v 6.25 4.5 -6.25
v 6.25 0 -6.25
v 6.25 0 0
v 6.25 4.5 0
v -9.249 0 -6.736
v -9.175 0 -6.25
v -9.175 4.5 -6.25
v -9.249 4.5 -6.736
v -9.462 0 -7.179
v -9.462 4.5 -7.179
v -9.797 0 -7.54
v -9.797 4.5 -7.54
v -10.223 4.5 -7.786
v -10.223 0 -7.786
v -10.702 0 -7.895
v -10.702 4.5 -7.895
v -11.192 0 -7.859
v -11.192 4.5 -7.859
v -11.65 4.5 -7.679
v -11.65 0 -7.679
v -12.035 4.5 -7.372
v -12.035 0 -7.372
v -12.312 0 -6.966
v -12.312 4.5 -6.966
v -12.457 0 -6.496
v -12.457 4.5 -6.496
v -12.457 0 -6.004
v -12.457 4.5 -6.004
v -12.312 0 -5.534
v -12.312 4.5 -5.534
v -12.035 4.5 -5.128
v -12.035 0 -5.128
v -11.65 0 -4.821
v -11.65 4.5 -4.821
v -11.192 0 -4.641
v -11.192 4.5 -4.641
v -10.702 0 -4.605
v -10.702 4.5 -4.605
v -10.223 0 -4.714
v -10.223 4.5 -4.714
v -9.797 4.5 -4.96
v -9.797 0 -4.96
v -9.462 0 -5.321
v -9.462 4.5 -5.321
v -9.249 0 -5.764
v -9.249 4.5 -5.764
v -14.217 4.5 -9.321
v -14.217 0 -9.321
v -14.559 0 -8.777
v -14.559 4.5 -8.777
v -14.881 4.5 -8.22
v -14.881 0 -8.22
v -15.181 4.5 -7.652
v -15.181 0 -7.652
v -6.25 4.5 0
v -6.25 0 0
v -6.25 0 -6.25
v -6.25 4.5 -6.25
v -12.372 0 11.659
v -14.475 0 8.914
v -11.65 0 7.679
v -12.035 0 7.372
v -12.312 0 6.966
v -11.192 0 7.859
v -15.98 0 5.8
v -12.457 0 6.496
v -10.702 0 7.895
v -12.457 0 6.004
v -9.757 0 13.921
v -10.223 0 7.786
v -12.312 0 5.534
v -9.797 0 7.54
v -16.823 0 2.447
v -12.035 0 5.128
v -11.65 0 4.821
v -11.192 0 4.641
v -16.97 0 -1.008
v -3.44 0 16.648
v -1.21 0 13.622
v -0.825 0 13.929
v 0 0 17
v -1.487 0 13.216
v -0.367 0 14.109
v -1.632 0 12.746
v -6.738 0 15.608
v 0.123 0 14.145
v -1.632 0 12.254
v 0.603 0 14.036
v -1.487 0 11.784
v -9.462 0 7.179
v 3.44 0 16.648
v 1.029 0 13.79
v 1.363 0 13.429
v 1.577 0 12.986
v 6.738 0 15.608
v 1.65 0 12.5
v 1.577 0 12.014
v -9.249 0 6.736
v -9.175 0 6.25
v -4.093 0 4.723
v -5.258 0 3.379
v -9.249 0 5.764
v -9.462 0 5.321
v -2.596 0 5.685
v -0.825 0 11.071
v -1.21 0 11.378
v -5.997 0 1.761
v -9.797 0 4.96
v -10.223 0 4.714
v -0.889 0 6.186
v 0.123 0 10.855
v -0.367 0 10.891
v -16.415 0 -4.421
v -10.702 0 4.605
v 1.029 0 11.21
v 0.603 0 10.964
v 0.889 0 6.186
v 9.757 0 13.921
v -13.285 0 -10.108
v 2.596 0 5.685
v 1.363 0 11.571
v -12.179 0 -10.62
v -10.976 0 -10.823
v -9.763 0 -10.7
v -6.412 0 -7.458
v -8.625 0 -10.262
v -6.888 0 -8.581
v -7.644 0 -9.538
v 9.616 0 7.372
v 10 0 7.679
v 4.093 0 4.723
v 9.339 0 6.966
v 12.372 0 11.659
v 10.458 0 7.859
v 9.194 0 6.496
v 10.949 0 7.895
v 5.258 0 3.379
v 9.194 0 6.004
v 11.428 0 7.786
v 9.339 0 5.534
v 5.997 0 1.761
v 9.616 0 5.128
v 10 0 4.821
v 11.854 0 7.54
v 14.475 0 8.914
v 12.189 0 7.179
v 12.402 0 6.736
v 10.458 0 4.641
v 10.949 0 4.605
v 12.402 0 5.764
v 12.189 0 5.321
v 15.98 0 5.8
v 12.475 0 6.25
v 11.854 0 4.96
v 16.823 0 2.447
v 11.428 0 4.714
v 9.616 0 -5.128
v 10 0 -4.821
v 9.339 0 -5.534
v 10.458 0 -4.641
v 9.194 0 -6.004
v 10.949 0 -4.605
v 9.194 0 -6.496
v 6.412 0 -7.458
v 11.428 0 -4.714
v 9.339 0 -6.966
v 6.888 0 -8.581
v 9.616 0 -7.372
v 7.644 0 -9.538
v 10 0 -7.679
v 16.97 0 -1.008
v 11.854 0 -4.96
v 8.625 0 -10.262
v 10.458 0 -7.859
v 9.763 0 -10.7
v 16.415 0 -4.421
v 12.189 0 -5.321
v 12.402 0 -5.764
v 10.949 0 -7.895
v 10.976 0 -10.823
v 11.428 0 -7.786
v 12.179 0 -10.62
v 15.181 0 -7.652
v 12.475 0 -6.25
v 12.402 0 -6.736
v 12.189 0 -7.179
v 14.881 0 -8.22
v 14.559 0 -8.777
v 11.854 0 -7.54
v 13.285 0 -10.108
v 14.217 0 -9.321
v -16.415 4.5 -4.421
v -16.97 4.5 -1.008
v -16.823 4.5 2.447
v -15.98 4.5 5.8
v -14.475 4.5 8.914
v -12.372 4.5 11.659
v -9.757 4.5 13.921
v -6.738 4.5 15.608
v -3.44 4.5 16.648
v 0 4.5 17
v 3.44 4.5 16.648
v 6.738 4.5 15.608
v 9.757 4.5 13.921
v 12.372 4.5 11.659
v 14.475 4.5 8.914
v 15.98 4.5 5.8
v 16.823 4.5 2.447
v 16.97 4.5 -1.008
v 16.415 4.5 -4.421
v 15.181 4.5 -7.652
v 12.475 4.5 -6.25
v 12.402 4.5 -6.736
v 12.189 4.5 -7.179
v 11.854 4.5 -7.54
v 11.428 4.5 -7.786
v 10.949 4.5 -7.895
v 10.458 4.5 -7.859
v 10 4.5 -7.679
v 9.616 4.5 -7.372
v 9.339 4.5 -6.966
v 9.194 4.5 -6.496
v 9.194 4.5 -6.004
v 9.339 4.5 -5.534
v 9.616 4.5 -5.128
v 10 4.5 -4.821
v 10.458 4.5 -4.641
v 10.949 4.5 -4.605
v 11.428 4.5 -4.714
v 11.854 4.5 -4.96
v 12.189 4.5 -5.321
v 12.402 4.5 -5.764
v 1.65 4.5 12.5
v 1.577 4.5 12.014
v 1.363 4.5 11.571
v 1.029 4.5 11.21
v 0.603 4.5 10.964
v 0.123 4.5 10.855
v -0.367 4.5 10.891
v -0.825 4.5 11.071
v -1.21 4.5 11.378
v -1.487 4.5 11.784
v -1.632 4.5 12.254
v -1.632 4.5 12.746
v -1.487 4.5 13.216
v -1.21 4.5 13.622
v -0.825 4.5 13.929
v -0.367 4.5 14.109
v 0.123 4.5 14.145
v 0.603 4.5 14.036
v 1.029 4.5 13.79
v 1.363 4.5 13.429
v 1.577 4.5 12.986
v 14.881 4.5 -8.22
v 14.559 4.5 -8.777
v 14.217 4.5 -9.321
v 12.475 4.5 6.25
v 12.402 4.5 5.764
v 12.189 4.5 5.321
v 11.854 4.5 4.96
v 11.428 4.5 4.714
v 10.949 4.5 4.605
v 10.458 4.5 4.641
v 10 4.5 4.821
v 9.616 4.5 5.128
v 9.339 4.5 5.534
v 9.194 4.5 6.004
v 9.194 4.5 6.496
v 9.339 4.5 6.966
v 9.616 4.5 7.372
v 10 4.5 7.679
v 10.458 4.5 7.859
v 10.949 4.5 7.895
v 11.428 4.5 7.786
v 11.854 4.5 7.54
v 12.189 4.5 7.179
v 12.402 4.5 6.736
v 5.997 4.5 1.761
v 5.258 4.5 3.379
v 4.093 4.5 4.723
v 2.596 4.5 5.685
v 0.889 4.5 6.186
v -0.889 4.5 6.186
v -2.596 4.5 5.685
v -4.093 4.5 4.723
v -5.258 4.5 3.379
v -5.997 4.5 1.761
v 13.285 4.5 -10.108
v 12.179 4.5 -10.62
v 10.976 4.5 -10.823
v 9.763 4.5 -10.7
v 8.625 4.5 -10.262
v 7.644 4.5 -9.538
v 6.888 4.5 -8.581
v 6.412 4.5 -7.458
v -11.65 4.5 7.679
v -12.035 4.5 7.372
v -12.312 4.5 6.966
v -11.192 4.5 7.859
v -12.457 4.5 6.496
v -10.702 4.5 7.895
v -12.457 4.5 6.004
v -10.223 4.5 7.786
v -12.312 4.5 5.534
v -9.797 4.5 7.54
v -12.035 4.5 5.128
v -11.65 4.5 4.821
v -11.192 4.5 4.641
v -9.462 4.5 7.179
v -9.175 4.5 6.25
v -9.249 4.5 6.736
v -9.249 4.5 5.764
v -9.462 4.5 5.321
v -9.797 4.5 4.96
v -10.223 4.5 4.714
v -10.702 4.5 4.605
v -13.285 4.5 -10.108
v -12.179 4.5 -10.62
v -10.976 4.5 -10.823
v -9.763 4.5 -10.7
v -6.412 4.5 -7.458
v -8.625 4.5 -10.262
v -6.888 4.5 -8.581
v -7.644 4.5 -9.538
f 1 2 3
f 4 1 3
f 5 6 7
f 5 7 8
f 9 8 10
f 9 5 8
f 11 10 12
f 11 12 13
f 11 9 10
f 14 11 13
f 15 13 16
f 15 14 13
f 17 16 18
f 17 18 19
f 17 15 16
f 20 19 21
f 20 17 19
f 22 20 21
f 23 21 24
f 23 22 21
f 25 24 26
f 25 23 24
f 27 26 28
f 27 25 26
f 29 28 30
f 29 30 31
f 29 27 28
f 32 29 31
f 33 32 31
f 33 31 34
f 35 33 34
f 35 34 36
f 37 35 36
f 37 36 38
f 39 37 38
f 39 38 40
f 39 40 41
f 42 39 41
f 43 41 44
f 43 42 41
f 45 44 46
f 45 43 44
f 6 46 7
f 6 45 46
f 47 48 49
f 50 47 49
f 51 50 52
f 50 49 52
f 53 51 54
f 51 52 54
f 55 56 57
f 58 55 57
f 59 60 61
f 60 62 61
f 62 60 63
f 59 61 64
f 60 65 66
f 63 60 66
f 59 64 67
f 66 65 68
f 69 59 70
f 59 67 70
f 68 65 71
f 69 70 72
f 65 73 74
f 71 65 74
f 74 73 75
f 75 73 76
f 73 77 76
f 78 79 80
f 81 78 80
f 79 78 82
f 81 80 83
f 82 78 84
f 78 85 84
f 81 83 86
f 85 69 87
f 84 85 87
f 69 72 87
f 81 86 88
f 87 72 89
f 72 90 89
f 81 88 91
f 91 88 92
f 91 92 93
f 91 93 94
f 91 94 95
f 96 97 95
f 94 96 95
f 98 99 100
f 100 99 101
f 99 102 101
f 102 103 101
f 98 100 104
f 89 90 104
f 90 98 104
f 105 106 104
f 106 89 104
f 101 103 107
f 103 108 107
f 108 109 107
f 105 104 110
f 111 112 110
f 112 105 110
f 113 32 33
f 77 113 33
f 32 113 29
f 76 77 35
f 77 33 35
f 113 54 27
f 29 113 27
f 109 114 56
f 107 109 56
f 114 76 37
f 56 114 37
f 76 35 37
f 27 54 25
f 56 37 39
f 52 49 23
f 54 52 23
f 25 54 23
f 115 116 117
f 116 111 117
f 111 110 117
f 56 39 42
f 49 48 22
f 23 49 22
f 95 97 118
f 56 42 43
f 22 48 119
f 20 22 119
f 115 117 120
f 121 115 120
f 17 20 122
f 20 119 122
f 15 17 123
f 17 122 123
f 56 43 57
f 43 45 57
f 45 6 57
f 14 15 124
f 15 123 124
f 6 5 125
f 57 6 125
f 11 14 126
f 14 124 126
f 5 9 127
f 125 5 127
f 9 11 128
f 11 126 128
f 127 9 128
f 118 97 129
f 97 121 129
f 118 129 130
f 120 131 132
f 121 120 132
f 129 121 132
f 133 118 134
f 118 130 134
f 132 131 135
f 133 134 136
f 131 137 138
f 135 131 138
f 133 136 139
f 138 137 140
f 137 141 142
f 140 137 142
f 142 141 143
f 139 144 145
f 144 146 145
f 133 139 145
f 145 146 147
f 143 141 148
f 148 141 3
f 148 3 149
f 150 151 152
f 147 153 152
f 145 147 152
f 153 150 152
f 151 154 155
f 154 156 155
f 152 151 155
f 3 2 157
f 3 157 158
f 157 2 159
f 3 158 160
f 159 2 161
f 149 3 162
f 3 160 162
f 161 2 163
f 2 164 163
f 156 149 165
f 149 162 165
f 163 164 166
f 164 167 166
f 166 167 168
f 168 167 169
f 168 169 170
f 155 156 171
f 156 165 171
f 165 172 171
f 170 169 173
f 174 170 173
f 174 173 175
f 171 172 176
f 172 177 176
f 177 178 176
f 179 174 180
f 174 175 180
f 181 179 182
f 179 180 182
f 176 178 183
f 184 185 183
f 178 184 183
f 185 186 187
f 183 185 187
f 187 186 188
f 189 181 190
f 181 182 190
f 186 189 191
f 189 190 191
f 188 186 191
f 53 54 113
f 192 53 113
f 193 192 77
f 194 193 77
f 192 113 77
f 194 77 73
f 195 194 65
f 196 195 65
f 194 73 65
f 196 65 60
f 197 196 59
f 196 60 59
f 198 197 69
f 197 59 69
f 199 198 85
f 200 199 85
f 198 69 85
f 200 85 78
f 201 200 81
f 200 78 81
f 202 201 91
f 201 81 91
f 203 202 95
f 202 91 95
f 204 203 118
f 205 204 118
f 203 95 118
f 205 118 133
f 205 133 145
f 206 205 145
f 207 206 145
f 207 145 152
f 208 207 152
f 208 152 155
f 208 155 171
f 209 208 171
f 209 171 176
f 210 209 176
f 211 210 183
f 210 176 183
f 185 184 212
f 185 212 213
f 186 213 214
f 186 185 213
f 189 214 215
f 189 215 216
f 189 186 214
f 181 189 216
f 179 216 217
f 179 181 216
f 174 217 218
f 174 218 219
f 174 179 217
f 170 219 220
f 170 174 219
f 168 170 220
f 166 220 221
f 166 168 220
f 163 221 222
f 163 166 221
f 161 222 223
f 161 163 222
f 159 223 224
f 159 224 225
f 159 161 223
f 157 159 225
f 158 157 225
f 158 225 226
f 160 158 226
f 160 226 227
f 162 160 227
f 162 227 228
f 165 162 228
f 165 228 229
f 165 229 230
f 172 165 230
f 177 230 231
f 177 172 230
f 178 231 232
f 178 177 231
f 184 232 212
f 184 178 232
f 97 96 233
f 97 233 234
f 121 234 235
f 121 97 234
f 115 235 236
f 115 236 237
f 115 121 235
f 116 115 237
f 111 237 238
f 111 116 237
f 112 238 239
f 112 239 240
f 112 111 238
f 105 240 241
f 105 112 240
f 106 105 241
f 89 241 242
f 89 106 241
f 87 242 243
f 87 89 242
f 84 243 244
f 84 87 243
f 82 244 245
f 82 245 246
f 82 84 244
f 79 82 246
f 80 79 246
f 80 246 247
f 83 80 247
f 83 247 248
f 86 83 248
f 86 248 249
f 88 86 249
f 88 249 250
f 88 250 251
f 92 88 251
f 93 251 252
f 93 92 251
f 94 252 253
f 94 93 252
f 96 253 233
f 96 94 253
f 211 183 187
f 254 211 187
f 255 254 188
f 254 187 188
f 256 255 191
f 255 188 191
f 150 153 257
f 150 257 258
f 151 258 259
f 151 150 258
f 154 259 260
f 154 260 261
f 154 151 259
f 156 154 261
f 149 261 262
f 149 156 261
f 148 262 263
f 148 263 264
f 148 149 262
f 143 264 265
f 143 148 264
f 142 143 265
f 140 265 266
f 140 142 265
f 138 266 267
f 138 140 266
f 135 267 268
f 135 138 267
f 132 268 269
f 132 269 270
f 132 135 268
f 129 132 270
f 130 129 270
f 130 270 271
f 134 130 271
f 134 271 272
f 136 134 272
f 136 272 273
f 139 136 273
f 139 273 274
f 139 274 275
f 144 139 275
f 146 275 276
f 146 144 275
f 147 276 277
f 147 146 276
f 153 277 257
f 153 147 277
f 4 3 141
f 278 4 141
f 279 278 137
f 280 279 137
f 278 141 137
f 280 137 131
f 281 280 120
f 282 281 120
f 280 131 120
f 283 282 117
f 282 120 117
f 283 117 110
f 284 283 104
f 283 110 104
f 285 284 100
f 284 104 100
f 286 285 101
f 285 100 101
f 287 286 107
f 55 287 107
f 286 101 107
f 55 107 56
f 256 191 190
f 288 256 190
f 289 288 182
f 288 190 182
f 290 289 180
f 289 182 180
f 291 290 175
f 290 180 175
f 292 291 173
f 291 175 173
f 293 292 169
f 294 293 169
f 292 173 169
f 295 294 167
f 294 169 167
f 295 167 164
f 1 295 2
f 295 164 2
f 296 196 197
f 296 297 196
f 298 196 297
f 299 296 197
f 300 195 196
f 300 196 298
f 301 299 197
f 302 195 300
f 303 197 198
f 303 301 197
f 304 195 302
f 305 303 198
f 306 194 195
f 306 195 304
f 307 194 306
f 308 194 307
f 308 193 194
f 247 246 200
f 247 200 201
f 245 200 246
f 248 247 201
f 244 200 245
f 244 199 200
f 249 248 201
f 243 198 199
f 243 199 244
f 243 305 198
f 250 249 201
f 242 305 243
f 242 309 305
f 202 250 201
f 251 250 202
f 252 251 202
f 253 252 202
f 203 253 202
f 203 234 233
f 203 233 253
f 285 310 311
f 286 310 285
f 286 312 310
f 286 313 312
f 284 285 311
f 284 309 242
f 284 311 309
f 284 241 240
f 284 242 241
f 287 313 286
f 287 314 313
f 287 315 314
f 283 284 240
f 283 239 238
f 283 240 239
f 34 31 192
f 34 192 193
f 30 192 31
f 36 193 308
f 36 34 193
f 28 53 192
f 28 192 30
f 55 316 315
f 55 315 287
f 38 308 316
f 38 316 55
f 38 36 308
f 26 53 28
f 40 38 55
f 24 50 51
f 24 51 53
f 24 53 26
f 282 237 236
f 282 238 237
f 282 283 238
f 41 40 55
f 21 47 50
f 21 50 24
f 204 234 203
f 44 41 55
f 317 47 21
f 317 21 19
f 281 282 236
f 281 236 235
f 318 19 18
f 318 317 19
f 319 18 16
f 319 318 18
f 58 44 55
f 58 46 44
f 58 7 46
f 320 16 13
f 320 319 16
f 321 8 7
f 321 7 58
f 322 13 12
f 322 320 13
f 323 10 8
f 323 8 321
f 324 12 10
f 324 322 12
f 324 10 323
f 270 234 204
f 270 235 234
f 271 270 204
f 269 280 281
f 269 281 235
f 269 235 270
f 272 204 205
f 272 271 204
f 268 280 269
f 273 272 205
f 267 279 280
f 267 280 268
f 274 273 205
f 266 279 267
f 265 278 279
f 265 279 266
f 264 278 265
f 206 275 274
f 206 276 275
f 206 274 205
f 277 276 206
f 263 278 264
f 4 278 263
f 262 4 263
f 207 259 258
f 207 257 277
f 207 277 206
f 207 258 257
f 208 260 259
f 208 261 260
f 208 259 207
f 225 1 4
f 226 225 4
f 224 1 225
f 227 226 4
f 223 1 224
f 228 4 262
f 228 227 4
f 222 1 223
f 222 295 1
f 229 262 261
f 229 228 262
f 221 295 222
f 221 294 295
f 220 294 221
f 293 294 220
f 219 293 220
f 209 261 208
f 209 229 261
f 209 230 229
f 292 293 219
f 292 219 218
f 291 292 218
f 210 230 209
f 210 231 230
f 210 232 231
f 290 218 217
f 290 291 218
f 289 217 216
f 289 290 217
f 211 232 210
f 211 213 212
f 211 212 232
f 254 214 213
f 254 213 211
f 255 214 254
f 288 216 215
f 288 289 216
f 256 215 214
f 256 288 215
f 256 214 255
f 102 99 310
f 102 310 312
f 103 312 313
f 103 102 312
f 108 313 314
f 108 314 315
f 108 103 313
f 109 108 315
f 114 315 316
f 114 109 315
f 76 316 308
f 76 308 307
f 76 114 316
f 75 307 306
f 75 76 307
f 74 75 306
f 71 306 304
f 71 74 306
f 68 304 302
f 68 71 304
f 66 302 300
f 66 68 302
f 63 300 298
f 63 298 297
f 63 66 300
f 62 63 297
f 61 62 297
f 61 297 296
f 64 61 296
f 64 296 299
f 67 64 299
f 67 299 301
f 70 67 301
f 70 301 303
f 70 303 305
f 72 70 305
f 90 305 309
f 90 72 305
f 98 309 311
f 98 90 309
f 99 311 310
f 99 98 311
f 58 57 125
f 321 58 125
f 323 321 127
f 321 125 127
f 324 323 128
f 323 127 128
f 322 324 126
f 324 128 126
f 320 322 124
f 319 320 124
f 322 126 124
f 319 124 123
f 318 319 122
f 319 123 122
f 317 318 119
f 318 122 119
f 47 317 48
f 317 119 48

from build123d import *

# Parameters (mm, degrees)
SKETCH1_R           = 1.65
BOSS_EXTRUDE1_DEPTH = 4.5


with BuildPart() as part:
    # Sketch1 → Boss-Extrude1 (new body)
    with BuildSketch(Plane(origin=(0, 0, 0), x_dir=(1, 0, 0), z_dir=(0, 1, 0))):
        with BuildLine():
            Line((6.25, 6.25), (6.25, 0))
            ThreePointArc((6.25, 0), (0, -6.25), (-6.25, 0))
            Line((-6.25, 0), (-6.25, 6.25))
            ThreePointArc((-6.25, 6.25), (-9.179700773, 10.519130601), (-14.216868268, 9.320979382))
            ThreePointArc((-14.216868268, 9.320979382), (-14.722431864, 8.5), (-15.180639067, 7.651679391))
            ThreePointArc((-15.180639067, 7.651679391), (0, -17), (15.180639067, 7.651679391))
            ThreePointArc((15.180639067, 7.651679391), (14.722431864, 8.5), (14.216868268, 9.320979382))
            ThreePointArc((14.216868268, 9.320979382), (9.179700773, 10.519130601), (6.25, 6.25))
        make_face()
        with Locations((-10.825317547, -6.25)):
            Circle(SKETCH1_R, mode=Mode.SUBTRACT)
        with Locations((0, -12.5)):
            Circle(SKETCH1_R, mode=Mode.SUBTRACT)
        with Locations((10.825317547, -6.25)):
            Circle(SKETCH1_R, mode=Mode.SUBTRACT)
        with Locations((-10.825317547, 6.25)):
            Circle(SKETCH1_R, mode=Mode.SUBTRACT)
        with Locations((10.825317547, 6.25)):
            Circle(SKETCH1_R, mode=Mode.SUBTRACT)
    extrude(amount=BOSS_EXTRUDE1_DEPTH)


solid = part.part
